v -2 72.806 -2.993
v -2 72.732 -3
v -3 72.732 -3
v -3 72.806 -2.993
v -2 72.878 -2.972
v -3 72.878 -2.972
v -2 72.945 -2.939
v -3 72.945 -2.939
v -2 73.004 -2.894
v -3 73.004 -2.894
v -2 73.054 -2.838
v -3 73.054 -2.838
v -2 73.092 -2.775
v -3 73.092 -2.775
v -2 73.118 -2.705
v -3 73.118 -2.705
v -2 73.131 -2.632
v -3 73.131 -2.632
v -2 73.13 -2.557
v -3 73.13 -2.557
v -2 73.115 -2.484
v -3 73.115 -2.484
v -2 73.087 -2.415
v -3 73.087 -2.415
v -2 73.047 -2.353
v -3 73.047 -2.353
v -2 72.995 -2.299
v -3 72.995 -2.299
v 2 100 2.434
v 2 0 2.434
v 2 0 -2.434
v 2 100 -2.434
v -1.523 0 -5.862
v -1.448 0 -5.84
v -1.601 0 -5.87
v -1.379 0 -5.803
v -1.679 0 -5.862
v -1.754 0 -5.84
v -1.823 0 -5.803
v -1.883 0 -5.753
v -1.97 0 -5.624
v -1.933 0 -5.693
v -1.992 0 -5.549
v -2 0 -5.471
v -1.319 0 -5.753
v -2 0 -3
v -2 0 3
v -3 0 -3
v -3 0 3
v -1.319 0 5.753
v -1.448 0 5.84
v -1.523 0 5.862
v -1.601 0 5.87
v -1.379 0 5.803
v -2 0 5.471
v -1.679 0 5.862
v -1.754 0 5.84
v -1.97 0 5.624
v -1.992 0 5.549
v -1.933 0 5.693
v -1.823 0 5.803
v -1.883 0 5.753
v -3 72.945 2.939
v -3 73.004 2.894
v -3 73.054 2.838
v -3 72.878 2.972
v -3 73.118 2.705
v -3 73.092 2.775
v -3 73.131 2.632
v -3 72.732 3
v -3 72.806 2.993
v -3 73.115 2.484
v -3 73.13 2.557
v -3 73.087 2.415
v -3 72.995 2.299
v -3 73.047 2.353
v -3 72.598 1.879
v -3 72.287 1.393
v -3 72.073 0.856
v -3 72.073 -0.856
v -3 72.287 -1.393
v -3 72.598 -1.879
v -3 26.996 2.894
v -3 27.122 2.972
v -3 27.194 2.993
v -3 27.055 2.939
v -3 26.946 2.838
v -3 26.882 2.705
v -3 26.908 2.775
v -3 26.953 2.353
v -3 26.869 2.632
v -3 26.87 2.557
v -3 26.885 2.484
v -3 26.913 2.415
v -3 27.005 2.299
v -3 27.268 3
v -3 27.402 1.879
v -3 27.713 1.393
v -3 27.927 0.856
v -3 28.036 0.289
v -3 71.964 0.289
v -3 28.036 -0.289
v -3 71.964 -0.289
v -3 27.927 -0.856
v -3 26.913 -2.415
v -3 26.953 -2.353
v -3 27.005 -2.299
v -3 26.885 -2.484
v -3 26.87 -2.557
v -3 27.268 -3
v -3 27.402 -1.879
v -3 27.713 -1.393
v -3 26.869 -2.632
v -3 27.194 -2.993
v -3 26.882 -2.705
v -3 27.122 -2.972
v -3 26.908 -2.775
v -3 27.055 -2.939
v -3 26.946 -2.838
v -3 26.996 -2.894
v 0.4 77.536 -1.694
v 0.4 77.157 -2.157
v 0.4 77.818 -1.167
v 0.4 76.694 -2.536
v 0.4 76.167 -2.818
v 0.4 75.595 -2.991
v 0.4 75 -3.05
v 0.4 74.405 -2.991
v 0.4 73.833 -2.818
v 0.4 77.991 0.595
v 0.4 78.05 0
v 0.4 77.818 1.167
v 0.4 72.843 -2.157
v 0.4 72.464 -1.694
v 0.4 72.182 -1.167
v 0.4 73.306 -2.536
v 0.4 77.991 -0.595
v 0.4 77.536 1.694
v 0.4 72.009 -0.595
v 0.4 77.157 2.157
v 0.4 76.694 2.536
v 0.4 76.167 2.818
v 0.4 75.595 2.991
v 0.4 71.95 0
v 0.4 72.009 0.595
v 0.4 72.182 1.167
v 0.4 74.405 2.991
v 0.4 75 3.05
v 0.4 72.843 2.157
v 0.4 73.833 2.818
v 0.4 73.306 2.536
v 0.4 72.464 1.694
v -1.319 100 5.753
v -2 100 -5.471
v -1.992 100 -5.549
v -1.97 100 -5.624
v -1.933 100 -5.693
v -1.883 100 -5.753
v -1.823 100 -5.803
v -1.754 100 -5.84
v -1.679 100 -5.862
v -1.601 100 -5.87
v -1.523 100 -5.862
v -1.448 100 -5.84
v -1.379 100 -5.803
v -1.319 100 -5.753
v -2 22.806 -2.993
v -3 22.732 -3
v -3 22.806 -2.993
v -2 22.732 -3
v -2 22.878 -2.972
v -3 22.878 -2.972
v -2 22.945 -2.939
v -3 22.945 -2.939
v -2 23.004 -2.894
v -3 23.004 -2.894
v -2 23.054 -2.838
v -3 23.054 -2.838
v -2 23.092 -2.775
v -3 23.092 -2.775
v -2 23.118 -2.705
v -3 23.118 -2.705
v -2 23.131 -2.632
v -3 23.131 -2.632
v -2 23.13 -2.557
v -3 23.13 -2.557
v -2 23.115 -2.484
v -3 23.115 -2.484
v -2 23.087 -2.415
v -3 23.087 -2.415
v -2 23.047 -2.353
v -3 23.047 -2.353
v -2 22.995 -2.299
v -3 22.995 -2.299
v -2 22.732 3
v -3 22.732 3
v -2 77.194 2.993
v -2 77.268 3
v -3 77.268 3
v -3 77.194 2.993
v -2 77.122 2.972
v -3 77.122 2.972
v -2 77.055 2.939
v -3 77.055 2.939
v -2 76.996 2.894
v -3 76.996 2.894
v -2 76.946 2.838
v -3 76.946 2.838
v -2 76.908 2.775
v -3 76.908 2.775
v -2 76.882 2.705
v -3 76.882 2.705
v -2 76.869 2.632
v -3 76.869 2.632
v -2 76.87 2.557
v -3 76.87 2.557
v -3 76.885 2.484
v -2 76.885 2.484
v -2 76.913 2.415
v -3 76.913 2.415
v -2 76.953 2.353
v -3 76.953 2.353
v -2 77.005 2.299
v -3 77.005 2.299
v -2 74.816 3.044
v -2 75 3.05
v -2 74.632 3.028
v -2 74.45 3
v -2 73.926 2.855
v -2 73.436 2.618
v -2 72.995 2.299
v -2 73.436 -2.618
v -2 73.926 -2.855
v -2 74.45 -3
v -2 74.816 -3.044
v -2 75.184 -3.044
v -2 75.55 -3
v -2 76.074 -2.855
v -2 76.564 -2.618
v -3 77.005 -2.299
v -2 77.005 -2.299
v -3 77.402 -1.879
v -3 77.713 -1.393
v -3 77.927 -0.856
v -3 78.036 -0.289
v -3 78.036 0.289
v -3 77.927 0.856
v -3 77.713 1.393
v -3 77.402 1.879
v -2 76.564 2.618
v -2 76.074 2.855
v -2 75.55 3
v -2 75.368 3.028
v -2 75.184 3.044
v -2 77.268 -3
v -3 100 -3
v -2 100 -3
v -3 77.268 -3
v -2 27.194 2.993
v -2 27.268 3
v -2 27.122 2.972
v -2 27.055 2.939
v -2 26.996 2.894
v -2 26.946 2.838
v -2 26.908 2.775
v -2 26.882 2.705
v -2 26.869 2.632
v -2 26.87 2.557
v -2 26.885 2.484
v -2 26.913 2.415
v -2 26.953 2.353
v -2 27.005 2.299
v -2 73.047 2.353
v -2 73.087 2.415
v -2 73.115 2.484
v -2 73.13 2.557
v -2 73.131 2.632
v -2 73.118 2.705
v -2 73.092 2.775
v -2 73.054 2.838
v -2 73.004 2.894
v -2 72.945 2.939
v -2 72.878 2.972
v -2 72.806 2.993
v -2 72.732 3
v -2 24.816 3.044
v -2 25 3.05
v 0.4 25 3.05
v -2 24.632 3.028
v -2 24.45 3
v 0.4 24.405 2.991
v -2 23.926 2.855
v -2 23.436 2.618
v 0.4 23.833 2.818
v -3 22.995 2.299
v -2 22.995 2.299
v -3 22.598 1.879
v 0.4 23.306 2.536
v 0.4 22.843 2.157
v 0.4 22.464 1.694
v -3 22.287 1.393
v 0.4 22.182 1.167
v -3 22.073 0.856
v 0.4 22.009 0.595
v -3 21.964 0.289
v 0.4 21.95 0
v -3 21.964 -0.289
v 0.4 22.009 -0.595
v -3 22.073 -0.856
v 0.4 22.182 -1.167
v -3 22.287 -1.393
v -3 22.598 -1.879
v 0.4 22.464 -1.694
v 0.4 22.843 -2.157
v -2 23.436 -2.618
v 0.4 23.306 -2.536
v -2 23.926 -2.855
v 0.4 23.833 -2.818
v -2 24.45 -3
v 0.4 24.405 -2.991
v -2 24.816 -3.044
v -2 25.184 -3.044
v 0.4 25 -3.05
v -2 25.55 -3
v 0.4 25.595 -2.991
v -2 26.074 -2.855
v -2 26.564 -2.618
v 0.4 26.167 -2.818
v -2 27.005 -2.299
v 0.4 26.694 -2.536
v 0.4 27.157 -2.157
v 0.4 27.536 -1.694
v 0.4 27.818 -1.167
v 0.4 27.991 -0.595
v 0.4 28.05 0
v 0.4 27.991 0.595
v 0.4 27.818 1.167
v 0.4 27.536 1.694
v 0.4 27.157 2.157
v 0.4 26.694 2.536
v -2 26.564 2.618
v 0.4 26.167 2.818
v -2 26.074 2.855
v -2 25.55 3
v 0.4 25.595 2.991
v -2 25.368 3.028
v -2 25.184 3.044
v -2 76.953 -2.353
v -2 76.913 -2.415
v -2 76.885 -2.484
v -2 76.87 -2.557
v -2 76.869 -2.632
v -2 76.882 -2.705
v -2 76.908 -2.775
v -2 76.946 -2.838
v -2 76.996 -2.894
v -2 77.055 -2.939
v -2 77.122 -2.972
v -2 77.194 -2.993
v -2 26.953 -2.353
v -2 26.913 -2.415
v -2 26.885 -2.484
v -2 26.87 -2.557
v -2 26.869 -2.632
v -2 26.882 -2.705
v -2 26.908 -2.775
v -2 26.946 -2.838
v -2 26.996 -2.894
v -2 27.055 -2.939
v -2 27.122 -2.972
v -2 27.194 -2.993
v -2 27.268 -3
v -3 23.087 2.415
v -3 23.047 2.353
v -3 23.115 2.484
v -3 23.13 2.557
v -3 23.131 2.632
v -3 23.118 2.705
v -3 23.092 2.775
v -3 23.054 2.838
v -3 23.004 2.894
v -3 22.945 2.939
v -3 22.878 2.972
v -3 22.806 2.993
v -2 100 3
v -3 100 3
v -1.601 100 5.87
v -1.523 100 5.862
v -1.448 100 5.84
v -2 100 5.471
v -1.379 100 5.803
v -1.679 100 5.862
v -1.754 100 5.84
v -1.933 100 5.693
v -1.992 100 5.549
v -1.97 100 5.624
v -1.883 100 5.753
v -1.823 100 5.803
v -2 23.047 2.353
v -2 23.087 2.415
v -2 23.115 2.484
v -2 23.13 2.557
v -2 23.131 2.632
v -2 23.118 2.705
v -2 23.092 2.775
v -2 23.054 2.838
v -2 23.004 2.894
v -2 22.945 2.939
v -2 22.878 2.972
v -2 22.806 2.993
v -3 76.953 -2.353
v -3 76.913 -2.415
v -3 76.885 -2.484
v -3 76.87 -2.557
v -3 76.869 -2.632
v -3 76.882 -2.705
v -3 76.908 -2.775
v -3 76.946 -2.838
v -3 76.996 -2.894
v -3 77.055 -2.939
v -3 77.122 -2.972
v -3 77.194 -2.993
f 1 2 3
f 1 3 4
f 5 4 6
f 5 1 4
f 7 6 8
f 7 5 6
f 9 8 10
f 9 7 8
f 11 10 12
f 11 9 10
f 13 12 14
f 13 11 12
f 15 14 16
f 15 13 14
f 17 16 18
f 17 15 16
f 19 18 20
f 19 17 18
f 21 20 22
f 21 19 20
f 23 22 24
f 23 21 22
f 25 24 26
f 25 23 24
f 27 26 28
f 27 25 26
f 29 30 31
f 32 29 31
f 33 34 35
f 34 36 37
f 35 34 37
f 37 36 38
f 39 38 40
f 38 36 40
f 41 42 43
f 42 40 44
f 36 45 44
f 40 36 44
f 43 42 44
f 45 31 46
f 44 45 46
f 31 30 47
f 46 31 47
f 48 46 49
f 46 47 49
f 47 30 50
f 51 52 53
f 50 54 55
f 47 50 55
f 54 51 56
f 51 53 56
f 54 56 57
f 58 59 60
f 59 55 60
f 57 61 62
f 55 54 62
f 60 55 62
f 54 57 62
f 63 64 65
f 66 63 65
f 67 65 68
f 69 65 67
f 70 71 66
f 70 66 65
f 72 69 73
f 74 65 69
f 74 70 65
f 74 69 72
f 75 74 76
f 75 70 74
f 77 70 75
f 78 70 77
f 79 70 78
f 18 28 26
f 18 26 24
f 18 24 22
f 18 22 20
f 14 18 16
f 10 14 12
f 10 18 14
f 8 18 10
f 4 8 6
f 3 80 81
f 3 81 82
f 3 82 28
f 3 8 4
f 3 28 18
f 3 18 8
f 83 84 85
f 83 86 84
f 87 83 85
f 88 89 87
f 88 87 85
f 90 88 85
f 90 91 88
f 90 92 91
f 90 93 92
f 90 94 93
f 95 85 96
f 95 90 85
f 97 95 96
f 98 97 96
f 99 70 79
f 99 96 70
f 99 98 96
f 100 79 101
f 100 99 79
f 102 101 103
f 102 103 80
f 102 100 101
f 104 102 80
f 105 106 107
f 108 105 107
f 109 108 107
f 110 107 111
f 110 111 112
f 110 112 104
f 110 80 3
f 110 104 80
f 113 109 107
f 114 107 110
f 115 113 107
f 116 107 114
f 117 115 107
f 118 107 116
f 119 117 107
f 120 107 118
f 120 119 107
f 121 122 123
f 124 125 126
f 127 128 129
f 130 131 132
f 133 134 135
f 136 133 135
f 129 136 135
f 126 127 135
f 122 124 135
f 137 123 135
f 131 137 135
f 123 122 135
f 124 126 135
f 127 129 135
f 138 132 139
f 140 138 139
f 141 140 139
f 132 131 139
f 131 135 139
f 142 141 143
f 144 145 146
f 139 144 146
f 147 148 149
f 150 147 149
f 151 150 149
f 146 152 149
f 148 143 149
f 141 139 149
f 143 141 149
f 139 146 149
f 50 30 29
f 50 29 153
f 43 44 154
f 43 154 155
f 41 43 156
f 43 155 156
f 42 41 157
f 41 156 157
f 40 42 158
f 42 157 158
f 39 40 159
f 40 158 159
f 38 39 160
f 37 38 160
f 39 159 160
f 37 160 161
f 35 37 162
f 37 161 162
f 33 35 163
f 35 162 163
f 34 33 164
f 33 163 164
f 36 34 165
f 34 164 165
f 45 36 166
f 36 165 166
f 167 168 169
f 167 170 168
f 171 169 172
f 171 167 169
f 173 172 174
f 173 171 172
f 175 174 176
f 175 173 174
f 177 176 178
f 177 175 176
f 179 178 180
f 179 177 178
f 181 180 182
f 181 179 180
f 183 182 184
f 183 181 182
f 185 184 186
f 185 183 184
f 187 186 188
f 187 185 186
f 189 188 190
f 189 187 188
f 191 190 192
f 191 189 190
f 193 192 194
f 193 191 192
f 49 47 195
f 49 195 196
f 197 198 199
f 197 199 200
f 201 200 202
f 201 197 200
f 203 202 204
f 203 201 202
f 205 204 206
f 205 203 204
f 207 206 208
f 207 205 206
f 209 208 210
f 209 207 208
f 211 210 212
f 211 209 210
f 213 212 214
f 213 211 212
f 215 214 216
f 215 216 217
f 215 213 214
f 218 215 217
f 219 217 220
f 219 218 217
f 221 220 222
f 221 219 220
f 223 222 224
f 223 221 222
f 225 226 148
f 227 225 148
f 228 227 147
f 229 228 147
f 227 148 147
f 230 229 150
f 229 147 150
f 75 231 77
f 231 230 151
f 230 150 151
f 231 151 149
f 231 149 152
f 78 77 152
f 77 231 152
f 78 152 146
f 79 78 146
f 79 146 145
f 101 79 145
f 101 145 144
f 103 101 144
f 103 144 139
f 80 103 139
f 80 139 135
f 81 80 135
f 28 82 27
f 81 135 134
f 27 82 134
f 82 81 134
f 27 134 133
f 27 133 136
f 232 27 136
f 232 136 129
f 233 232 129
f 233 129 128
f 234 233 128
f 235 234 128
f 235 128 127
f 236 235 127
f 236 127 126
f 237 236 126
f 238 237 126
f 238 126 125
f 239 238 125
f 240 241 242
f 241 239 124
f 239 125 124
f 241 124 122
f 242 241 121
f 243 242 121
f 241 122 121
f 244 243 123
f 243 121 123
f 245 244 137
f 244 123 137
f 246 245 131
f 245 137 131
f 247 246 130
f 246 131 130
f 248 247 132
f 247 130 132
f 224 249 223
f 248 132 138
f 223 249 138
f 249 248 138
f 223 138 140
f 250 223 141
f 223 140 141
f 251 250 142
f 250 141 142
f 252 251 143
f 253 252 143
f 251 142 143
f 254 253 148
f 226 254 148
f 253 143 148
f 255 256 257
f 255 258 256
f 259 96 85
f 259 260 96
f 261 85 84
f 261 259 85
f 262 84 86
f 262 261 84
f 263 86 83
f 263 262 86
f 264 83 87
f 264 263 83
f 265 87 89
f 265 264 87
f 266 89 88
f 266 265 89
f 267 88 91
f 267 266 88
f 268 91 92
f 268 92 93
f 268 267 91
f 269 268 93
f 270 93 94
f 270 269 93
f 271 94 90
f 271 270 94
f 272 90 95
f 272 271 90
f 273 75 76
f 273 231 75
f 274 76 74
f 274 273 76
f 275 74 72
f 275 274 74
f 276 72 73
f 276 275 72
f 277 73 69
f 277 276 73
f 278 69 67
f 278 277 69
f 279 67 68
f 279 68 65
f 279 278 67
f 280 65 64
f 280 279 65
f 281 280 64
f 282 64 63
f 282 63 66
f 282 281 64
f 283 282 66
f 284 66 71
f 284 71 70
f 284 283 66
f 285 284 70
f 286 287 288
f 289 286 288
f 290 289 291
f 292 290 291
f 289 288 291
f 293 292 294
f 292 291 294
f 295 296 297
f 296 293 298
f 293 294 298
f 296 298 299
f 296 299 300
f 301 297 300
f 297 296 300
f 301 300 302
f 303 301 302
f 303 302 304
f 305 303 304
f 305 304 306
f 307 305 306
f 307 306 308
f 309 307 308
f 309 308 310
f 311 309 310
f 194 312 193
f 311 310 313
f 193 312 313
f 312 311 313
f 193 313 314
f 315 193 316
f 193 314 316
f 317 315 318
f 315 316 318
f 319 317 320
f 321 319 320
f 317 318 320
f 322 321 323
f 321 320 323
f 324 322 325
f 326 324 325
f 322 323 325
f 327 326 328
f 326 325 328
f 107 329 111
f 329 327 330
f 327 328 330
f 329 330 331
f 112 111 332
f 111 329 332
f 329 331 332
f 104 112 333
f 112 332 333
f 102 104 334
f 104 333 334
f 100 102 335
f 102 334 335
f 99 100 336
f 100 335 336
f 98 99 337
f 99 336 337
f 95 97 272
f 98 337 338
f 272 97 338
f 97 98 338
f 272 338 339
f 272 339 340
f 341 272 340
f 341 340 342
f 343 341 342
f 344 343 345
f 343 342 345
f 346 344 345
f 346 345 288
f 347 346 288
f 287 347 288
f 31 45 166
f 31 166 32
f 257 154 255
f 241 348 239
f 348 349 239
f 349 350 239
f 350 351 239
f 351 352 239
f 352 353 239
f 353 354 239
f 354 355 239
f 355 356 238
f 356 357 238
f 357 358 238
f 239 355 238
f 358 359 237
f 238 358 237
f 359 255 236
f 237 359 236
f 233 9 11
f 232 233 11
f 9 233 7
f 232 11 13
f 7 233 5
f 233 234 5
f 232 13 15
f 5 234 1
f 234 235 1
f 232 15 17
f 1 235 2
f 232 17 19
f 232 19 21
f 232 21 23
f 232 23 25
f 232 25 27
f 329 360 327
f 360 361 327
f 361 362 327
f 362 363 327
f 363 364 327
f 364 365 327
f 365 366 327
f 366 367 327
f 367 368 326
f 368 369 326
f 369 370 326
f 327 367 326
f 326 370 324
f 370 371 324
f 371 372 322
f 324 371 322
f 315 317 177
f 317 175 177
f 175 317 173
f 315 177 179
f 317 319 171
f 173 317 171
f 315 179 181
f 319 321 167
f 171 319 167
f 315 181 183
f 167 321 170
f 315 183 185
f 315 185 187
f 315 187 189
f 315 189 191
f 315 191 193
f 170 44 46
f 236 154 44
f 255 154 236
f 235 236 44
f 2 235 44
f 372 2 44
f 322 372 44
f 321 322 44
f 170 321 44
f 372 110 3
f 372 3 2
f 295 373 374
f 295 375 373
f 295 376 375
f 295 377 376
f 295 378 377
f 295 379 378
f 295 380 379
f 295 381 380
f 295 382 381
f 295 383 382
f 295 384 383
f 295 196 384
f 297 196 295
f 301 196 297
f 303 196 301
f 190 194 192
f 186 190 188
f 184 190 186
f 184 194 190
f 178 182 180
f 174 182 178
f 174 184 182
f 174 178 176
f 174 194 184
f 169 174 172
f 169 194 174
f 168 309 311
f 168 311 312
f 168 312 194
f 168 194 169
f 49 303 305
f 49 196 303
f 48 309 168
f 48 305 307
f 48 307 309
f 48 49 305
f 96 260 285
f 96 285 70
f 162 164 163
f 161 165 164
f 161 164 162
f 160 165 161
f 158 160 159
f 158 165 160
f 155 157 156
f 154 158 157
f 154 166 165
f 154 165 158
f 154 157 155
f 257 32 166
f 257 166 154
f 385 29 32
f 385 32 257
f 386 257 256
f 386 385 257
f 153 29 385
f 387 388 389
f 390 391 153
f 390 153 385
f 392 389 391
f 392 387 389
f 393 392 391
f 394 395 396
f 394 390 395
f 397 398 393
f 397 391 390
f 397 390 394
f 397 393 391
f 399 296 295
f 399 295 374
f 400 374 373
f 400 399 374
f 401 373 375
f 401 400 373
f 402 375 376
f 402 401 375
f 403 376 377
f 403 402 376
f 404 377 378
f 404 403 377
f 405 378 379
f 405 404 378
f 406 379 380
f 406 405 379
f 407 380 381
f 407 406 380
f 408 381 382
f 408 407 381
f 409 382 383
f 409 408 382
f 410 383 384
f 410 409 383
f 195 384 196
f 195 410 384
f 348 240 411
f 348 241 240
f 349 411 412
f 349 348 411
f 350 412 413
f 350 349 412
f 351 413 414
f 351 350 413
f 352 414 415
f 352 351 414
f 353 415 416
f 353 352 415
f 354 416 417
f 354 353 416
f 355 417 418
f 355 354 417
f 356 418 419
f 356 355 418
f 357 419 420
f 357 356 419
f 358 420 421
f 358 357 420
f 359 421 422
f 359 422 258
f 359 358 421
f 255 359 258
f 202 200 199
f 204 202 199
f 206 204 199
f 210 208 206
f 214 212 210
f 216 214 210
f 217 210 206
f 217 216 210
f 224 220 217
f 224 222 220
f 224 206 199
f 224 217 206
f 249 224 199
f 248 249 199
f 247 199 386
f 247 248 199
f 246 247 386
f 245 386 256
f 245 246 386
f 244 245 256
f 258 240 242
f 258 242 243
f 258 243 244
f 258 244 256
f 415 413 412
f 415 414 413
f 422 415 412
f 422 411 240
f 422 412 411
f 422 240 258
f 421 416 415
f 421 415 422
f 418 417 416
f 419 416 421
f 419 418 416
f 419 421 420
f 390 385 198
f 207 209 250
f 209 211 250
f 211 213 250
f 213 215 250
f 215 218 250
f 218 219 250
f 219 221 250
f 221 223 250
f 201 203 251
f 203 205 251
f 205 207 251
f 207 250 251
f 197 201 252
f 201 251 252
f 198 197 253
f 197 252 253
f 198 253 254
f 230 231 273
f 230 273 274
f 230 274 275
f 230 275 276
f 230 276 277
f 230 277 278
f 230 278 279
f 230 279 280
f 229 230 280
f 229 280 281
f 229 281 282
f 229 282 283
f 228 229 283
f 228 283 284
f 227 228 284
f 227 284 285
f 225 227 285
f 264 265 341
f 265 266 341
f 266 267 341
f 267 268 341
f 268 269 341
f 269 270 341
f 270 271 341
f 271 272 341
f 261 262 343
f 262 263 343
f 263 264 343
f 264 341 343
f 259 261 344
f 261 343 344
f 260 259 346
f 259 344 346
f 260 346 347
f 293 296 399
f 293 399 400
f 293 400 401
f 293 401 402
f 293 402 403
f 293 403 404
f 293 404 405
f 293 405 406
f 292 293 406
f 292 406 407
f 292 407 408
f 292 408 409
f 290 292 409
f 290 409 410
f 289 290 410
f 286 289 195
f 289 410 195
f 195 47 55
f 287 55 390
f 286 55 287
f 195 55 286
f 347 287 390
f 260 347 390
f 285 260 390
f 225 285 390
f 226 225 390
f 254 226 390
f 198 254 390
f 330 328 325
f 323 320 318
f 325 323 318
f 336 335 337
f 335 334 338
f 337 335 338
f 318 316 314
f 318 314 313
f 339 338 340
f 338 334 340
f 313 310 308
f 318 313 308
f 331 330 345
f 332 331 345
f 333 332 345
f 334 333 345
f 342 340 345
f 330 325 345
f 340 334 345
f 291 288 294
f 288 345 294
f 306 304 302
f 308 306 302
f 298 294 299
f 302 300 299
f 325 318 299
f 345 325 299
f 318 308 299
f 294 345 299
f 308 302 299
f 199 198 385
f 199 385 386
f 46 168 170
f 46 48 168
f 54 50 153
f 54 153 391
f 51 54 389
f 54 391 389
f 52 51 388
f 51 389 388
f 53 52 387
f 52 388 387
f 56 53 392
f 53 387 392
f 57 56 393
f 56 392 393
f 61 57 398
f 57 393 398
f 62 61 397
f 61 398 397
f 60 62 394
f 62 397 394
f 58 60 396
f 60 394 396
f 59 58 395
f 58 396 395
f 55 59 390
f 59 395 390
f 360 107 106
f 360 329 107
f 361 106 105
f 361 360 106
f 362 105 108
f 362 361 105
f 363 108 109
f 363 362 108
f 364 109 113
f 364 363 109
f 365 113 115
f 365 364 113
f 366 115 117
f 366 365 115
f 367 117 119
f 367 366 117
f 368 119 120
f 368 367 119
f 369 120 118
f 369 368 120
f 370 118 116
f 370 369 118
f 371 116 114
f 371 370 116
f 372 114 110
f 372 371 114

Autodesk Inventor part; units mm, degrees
ref_plane "YZ Plane" through (0, 0, 0) normal (1, 0, 0) x (0, 1, 0)
ref_plane "XZ Plane" through (0, 0, 0) normal (0, 1, 0) x (-1, 0, 0)
ref_plane "XY Plane" through (0, 0, 0) normal (0, 0, 1) x (1, 0, 0)
sketch "Skizze1" plane through (0, 0, 0) normal (0, 1, 0) x (-1, 0, 0)
  line L0 (2, 6) -> (-2, 6)
  line L1 (-2, 6) -> (-2, -6)
  line L2 (-2, -6) -> (2, -6)
  line L3 (2, -6) -> (2, 6)
  line L4 (2, 6) -> (-2, -6) construction
  line L5 (-2, 6) -> (2, -6) construction
  line L6 (2, 3) -> (-2, 3)
  line L7 (-2, 3) -> (-2, -3)
  line L8 (-2, -3) -> (2, -3)
  line L9 (2, -3) -> (2, 3)
  line L10 (2, 3) -> (-2, -3) construction
  line L11 (-2, 3) -> (2, -3) construction
  line L12 (-2, 3) -> (1, 6)
  line L13 (-2, 3) -> (2.2426, 3) construction
  line L14 (-2, -3) -> (1, -6)
  line L15 (-2, -3) -> (2.2426, -3) construction
  line L16 (1, 3) -> (3, 3)
  line L17 (3, 3) -> (3, -3)
  line L18 (3, -3) -> (1, -3)
  line L19 (1, -3) -> (1, 3)
  line L20 (1, 3) -> (3, -3) construction
  line L21 (3, 3) -> (1, -3) construction
  line L22 (-4.4343, 0) -> (5.1226, 9.5569)
  line L23 (5.1226, 9.5569) -> (14.6795, 0)
  line L24 (14.6795, 0) -> (5.1226, -9.5569)
  line L25 (5.1226, -9.5569) -> (-4.4343, 0)
  point P0 (0, 0)
  point P1 (2, 0)
  point P2 (5.1226, 0)
  point P3 (-0.5, 4.5)
  point P4 (-0.5, -4.5)
  point P5 (1.5657, 6)
  point P6 (-2, 2.4343)
  point P7 (-2, -2.4343)
  point P8 (1.5657, -6)
  dimension "d0" = 4
  dimension "d1" = 12
  dimension "d2" = 6
  dimension "d3" = 45
  dimension "d4" = 45
  dimension "d5" = 2
  dimension "d6" = 6
  dimension "d25" = 0.4
  dimension "d26" = 0.4
extrude "Extrusion1" add sketch "Skizze1" along normal blind 100 contours L0 L3 L6 L22 | L6 L19 L8 L25 L1 L22 | L16 L17 L18 L3 | L3 L8 L19 L6 | L3 L2 L25 L8
sketch "Skizze2" plane through (-3, 0, -3) normal (-1, 0, 0) x (0, 0, 1)
  line L0 (5.4343, 100) -> (0.5657, 100) projected
  line L1 (3, 100) -> (3, 75)
  line L2 (6, 0) -> (6, 100) projected
  line L3 (3, 100) -> (28, 100) construction
  line L4 (3, 75) -> (3, 25)
  point P0 (3, 0)
  point P1 (0, 100)
  dimension "d9" = 25
  dimension "d10" = 90
  dimension "d11" = 50
  dimension "d12" = 180
hole "Bohrung1" at (-3, 75, 0) at (-3, 25, 0) direction (1, 0, 0) diameter 6.1 depth 3.4
fillet "Rundung1" radius 0.4 8 edges at (-2.5, 24.45, 3) (-2.5, 75.55, 3) (-2.5, 74.45, 3) (-2.5, 25.55, 3) (-2.5, 24.45, -3) (-2.5, 75.55, -3) (-2.5, 74.45, -3) (-2.5, 25.55, -3)
fillet "Rundung3" radius 0.4 4 edges at (-1.5657, 50, 6) (-2, 50, 6) (-2, 50, -6) (-1.5657, 50, -6)
equation "\"d26\" = d25"
properties part number "Extrusion_Inside"
